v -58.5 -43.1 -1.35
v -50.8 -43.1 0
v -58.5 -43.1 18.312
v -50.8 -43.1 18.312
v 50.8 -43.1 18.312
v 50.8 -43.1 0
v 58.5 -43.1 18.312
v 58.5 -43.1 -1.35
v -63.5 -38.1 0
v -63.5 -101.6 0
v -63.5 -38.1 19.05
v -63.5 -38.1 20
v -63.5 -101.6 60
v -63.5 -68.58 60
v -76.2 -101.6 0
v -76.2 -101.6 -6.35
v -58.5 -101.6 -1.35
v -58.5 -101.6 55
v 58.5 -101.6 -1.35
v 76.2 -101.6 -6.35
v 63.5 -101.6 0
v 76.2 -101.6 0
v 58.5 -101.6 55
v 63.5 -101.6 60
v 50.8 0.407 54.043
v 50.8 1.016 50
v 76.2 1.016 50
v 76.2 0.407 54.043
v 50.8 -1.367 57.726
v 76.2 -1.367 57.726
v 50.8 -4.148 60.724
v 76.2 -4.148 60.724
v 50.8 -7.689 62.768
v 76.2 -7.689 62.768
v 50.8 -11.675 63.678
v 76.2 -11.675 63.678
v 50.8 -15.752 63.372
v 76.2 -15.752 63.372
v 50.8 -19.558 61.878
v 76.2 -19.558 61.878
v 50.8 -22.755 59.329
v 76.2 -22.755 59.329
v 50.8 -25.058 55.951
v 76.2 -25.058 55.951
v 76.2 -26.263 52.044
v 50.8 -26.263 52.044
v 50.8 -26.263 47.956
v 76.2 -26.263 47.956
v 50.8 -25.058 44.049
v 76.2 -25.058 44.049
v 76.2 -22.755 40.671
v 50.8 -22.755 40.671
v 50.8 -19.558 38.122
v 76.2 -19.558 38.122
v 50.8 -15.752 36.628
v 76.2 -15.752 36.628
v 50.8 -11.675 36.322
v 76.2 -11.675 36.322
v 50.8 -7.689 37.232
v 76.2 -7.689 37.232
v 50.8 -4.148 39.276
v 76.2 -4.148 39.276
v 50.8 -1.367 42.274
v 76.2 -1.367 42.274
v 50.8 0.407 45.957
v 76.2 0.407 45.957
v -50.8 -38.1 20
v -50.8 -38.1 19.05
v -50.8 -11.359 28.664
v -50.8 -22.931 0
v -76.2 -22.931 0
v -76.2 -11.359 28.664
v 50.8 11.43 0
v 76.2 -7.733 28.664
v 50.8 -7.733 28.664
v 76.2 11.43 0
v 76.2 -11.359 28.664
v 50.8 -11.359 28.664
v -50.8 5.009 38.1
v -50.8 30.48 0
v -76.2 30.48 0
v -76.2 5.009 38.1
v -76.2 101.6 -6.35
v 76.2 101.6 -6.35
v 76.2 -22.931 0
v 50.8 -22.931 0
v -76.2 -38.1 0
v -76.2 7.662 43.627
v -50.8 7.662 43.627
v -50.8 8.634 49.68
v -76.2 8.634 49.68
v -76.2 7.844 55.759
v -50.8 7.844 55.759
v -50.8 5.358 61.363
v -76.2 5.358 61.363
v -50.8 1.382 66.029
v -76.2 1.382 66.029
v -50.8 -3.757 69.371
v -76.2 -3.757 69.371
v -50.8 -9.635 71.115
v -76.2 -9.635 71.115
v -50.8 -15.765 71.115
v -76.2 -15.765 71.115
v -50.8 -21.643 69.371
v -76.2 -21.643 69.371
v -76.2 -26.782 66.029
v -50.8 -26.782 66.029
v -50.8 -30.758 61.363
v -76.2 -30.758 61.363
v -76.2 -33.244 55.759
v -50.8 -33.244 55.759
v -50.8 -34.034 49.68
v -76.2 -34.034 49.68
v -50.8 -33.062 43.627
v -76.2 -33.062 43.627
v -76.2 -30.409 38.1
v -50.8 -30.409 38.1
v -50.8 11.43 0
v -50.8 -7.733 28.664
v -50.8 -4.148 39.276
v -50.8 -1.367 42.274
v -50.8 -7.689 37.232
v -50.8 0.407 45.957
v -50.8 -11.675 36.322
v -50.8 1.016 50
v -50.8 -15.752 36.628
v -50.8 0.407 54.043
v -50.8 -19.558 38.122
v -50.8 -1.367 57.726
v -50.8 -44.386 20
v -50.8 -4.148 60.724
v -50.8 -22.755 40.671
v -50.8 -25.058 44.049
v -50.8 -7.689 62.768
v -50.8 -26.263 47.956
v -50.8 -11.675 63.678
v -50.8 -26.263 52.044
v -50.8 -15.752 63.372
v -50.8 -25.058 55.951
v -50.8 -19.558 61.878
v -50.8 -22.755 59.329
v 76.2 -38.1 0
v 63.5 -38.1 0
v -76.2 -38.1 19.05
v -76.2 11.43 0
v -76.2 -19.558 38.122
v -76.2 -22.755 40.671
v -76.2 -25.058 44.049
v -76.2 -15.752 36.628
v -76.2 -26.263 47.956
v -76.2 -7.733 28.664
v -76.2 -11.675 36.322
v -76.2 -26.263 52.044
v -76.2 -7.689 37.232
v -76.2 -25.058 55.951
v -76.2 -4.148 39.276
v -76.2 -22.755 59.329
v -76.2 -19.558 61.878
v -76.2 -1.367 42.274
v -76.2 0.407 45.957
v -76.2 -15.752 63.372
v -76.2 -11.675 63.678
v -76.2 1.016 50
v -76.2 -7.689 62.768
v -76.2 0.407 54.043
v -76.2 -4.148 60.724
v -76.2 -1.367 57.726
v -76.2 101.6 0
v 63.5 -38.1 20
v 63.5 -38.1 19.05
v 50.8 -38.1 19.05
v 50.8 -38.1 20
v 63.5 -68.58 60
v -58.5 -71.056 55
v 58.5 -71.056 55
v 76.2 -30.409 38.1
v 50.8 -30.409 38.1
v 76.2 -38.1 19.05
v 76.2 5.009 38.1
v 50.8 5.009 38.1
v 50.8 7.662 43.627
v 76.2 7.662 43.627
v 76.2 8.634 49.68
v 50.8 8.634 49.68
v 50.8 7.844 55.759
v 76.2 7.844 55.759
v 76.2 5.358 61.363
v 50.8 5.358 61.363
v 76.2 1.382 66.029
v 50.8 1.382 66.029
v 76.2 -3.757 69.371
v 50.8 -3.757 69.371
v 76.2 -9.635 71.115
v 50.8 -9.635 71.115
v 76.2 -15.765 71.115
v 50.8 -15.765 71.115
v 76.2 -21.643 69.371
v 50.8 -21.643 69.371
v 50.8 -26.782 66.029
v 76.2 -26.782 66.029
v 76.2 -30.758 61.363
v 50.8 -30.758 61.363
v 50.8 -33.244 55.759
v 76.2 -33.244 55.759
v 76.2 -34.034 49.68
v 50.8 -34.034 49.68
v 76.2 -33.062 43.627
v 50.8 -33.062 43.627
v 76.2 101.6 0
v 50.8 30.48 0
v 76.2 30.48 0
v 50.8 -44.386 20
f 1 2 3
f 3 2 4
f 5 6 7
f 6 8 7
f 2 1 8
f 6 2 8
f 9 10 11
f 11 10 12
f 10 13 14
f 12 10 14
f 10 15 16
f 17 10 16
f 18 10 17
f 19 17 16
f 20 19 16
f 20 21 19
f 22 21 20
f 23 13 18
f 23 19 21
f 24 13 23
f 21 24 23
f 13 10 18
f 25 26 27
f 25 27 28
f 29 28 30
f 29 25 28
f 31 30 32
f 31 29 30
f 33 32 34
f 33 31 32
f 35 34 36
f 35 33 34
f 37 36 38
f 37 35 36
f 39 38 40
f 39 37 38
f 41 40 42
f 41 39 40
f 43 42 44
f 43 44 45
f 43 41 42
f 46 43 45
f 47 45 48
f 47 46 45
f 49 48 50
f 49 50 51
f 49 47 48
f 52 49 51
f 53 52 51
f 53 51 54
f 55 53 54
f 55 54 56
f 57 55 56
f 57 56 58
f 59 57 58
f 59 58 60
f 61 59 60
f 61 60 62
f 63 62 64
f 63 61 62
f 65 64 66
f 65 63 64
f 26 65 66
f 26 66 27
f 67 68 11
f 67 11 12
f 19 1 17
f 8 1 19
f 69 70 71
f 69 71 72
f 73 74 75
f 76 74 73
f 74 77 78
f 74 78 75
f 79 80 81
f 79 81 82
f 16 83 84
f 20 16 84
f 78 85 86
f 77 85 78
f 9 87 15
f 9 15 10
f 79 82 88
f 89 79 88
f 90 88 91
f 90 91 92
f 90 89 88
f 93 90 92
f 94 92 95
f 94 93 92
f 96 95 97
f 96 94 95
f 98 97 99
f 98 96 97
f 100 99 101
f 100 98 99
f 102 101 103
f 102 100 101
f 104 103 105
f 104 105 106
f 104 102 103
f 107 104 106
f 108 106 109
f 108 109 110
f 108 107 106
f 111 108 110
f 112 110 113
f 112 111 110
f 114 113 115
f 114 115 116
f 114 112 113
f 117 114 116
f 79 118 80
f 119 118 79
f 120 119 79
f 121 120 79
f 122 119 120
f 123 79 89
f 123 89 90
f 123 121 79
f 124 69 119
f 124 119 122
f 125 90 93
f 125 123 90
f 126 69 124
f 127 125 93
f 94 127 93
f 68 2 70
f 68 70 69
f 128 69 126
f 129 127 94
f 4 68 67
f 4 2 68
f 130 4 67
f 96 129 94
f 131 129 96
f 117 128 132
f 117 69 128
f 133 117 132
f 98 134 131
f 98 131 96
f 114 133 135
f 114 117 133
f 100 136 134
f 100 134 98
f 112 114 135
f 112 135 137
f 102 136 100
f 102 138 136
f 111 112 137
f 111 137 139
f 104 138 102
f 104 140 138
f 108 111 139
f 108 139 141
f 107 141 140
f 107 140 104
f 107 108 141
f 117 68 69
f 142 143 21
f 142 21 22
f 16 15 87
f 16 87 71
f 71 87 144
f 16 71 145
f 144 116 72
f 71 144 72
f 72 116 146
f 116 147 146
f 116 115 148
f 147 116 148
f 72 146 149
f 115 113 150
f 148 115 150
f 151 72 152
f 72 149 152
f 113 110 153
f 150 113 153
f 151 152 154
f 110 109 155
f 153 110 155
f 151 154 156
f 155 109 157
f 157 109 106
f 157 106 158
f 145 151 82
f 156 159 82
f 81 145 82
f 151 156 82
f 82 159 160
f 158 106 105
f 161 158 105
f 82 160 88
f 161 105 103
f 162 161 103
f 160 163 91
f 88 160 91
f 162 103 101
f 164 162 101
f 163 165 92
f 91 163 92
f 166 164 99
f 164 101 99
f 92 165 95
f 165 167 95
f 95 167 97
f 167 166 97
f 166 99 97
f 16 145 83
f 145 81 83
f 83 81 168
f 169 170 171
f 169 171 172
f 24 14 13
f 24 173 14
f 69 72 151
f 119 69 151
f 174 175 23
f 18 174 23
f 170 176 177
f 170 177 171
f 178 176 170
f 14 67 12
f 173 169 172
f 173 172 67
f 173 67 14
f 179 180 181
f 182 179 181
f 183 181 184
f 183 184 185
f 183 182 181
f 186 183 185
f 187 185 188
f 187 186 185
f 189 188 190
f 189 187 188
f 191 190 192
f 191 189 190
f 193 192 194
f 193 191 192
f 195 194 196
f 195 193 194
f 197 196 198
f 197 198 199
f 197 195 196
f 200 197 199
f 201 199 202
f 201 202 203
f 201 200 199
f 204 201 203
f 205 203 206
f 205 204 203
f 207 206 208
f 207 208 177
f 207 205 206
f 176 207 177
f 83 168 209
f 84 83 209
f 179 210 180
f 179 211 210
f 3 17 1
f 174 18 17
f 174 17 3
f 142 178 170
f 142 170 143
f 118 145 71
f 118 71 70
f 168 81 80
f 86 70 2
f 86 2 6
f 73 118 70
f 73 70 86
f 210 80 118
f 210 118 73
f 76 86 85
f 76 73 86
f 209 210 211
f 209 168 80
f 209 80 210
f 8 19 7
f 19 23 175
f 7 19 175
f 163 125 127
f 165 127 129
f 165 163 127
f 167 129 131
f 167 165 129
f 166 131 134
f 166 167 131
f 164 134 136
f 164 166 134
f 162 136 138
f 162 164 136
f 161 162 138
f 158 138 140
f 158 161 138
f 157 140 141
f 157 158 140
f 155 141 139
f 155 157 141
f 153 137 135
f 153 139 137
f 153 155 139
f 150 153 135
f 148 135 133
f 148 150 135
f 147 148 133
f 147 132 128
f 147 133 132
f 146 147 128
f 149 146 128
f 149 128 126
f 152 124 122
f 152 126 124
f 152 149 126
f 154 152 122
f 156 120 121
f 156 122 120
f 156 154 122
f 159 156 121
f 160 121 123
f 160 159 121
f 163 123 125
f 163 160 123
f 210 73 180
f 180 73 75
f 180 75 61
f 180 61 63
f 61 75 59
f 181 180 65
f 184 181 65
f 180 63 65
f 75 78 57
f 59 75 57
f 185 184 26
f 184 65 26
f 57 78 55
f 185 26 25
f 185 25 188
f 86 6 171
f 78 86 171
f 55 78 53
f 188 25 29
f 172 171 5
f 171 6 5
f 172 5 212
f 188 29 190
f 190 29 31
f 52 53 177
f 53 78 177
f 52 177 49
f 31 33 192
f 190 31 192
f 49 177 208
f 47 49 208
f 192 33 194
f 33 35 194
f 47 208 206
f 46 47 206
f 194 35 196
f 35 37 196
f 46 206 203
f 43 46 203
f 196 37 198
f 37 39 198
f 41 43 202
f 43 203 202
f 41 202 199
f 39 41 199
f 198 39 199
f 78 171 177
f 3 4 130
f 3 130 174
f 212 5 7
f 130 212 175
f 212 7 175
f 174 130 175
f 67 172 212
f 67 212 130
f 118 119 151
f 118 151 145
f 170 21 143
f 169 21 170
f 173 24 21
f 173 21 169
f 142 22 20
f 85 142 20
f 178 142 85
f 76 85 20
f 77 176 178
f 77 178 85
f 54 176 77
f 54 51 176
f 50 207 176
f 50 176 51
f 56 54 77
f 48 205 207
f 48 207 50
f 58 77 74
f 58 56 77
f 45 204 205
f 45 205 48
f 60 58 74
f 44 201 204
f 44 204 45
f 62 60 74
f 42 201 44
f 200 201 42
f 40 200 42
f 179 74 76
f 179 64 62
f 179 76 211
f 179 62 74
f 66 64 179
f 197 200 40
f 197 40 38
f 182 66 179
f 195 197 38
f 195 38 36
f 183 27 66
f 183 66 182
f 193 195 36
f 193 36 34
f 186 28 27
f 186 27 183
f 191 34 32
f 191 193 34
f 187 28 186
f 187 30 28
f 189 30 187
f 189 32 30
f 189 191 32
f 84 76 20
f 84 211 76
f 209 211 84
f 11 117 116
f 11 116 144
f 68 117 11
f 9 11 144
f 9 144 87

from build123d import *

# Parameters (mm, degrees)
F0_W          = 152.4
F0_H          = 203.2
F1_DEPTH      = 6.35
F3_DEPTH      = 63.5
F4_T          = 5
F4_T3_DEPTH   = 73.5
F4_T5_DEPTH   = 137
F6_R          = 13.716
F7_DEPTH      = 76.2
F5_W          = 101.6
F5_H          = 20
F8_DEPTH      = 63.501
F8_DEPTH_BACK = 139.701
F10_DEPTH     = 71.337


# Not quite as in the source:
# - a shell that OpenCascade refuses in one call is made with other operations: the cavity is built on its own and cut out


with BuildPart() as f1:
    # F0 (on Top) → F1 (new body)
    with BuildSketch(Plane.XY):
        Rectangle(F0_W, F0_H)
    extrude(amount=-F1_DEPTH)

    # F2 (on Right) → F3 (join, symmetric)
    with BuildSketch(Plane.YZ):
        Polygon((-101.6, 60), (-101.6, 0), (-38.1, 0), (-38.1, 20), (-68.58, 60), align=None)
    extrude(amount=F3_DEPTH, both=True)

    # F4: shell of thickness 5, made by hand


with BuildPart() as f4_core1:
    # F4_t2: copy of F1
    add(f1.part)

    # the walls: a layer under each face that stays
    f4_faces = [f4_core1.faces().sort_by_distance(p)[0] for p in [
        (0, 101.6, -3.175),
        (76.2, 0, -3.175),
        (-76.2, 0, -3.175),
        (0, 0, 0),
        (0, 0, -6.35),
        (63.5, -69.85, 30),
        (0, -38.1, 10),
        (-63.5, -69.85, 30),
        (0, -53.34, 40),
        (0, -85.09, 60),
    ]]
    thicken(f4_faces, amount=-F4_T, mode=Mode.SUBTRACT)

    # F4_s4 → F4_t3 (cut)
    with BuildSketch(Plane.XZ.offset(33.1)):
        Polygon((63.55, 0.05), (63.5, -5), (58.5, -5), (58.5, 0), align=None)
        Polygon((-63.55, 0.05), (-63.5, -5), (-58.5, -5), (-58.5, 0), align=None)
    extrude(amount=F4_T3_DEPTH, mode=Mode.SUBTRACT)

    # F4_s6 → F4_t5 (cut)
    with BuildSketch(Plane.YZ.offset(-68.5)):
        Polygon((-38.05, 0.05), (-38.1, -5), (-43.1, -5), (-43.1, 0), align=None)
    extrude(amount=F4_T5_DEPTH, mode=Mode.SUBTRACT)


with BuildPart() as f1_1:
    add(f1.part)

    # what is left inside the walls is the cavity
    f4_cavity = [f4_core1.part.solids().sort_by_distance(p)[0] for p in [
        (0, -82.1, -1.3),
    ]]
    add(f4_cavity, mode=Mode.SUBTRACT)

    # F6 (on Right) → F7 (join, symmetric)
    with BuildSketch(Plane.YZ):
        with BuildLine():
            Line((30.48, 0), (5.0091754749, 38.1))
            ThreePointArc((5.0091754749, 38.1), (-12.7, 71.336), (-30.4091754749, 38.1))
            Line((-30.4091754749, 38.1), (-38.1, 19.05))
            Line((-38.1, 19.05), (-38.1, 0))
            Line((-38.1, 0), (-22.9313431488, 0))
            Line((-22.9313431488, 0), (-11.3591754749, 28.664))
            Line((-11.3591754749, 28.664), (-7.7326171703, 28.664))
            Line((-7.7326171703, 28.664), (11.43, 0))
            Line((11.43, 0), (30.48, 0))
        make_face()
        with Locations((-12.7, 50)):
            Circle(F6_R, mode=Mode.SUBTRACT)
    extrude(amount=F7_DEPTH, both=True)

    # F5 (on face) → F8 (cut, two sides)
    with BuildSketch(Plane(origin=(0, -38.1, 0), x_dir=(-1, 0, 0), z_dir=(0, 1, 0))) as f8_sk:
        with Locations((0, 10)):
            Rectangle(F5_W, F5_H)
    extrude(amount=-F8_DEPTH, mode=Mode.SUBTRACT)
    extrude(f8_sk.sketch, amount=F8_DEPTH_BACK, mode=Mode.SUBTRACT)

    # F9 (on face) → F10 (cut, through all)
    with BuildSketch(Plane.XY):
        Polygon((50.8, 11.43), (50.8, 30.48), (-50.8, 30.48), (-50.8, 11.43), (-50.8, -22.9313431488), (-50.8, -38.1), (50.8, -38.1), (50.8, -22.9313431488), align=None)
    extrude(amount=F10_DEPTH, mode=Mode.SUBTRACT)


solid = f1_1.part
